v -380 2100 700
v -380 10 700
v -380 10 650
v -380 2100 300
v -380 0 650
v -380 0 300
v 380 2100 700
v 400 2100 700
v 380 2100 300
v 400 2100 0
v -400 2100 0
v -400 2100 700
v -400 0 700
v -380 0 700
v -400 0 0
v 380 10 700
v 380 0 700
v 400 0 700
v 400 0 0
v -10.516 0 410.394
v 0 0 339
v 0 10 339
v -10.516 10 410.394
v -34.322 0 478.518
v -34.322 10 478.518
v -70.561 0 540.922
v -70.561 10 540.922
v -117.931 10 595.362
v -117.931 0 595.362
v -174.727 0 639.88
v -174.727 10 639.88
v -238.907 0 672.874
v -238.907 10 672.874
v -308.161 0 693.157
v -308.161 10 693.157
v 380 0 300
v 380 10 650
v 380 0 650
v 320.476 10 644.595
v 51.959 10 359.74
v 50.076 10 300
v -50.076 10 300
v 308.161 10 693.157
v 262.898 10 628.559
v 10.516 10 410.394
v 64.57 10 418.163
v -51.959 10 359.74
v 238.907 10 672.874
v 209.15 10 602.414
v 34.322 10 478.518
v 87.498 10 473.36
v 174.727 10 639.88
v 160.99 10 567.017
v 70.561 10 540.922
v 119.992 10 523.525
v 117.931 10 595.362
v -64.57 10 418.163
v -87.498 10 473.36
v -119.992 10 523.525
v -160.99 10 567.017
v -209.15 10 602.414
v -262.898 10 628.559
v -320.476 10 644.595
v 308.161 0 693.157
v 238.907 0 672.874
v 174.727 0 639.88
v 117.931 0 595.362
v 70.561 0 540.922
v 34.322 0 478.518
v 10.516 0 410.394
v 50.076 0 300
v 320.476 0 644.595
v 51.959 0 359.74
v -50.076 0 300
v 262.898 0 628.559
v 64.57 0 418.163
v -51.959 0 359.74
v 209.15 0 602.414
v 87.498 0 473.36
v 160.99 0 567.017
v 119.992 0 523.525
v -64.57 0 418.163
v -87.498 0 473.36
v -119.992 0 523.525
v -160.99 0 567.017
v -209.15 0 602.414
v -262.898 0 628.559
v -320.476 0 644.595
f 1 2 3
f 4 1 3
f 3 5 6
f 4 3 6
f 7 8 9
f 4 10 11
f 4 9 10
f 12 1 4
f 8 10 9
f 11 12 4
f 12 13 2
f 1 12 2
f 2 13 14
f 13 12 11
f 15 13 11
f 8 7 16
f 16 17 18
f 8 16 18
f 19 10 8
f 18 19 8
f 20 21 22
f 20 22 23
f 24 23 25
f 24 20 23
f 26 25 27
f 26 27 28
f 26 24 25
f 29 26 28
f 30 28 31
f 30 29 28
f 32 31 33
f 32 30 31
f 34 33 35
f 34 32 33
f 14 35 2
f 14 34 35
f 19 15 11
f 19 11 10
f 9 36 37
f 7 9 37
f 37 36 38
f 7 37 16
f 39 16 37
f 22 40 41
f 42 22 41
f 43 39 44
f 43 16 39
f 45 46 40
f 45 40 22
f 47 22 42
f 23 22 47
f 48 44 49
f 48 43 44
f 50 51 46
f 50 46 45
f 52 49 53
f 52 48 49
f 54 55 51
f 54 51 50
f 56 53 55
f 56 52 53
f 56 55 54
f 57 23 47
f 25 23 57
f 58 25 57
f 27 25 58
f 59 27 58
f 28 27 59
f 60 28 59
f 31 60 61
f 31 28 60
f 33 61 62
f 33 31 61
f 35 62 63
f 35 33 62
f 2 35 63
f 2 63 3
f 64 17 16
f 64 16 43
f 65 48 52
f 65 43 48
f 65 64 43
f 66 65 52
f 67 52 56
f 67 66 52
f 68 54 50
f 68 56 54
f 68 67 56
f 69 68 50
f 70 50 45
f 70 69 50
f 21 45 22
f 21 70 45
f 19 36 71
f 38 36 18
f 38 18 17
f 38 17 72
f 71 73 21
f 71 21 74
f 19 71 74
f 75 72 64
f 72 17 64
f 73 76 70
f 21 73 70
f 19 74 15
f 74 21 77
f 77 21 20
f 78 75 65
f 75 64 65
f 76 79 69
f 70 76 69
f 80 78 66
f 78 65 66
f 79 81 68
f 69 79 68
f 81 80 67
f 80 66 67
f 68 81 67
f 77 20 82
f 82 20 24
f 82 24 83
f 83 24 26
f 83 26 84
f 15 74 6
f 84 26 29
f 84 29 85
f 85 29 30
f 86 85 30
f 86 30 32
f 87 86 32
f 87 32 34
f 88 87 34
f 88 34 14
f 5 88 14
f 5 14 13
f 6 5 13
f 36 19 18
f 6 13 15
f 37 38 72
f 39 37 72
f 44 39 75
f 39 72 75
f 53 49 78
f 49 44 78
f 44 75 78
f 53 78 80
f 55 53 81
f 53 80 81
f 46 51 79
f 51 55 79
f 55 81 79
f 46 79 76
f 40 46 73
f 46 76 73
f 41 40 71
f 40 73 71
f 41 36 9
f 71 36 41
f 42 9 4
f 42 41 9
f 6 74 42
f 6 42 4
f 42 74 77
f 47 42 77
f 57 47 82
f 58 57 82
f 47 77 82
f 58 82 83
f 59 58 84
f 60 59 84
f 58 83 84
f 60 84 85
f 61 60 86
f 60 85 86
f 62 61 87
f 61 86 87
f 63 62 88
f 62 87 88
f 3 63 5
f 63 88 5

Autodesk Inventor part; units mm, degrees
ref_plane "YZ Plane" through (0, 0, 0) normal (1, 0, 0) x (0, 1, 0)
ref_plane "XZ Plane" through (0, 0, 0) normal (0, 1, 0) x (-1, 0, 0)
ref_plane "XY Plane" through (0, 0, 0) normal (0, 0, 1) x (1, 0, 0)
sketch "Sketch1" plane through (0, 0, 0) normal (0, 1, 0) x (-1, 0, 0)
  line L0 (0, 0) -> (-400, 0)
  line L1 (-400, 0) -> (-400, 300)
  line L2 (-400, 300) -> (0, 300)
  line L3 (0, 300) -> (0, 0)
  line L4 (0, 300) -> (-20, 300)
  line L5 (-400, 300) -> (-380, 300)
  line L6 (-380, 300) -> (-380, 700)
  line L7 (-380, 700) -> (-400, 700)
  line L8 (-400, 700) -> (-400, 300)
  point P0 (-380, 300)
  dimension "d0" = 400
  dimension "d1" = 300
  dimension "d9" = 400
  dimension "d10" = 20
extrude "Extrusion1" add sketch "Sketch1" along normal blind 2100
sketch "Sketch3" plane through (0, 0, 0) normal (0, 1, 0) x (-1, 0, 0)
  line L0 (0, 300) -> (-380, 300) projected
  line L1 (-380, 300) -> (-380, 700) projected
  line L2 (-380, 700) -> (-400, 700) projected
  line L3 (-400, 700) -> (-400, 0) projected
  line L4 (-400, 0) -> (0, 0) projected
  line L5 (0, 0) -> (0, 300) projected
  arc A0 (0, 300) -> (-380, 700) centre (-380, 319.5) ccw
  arc A1 (-50.0758, 300) -> (-380, 650) centre (-380, 319.5) ccw
  dimension "d11" = 50
extrude "Extrusion3" add sketch "Sketch3" along normal blind 10 contours L0 A1 L1 A0
mirror "Mirror1" about plane through (0, 0, 0) normal (-1, 0, 0) of "Extrusion1", "Extrusion3"
equation "\"d9\" = d0"
properties part number "Electrical box 4"
